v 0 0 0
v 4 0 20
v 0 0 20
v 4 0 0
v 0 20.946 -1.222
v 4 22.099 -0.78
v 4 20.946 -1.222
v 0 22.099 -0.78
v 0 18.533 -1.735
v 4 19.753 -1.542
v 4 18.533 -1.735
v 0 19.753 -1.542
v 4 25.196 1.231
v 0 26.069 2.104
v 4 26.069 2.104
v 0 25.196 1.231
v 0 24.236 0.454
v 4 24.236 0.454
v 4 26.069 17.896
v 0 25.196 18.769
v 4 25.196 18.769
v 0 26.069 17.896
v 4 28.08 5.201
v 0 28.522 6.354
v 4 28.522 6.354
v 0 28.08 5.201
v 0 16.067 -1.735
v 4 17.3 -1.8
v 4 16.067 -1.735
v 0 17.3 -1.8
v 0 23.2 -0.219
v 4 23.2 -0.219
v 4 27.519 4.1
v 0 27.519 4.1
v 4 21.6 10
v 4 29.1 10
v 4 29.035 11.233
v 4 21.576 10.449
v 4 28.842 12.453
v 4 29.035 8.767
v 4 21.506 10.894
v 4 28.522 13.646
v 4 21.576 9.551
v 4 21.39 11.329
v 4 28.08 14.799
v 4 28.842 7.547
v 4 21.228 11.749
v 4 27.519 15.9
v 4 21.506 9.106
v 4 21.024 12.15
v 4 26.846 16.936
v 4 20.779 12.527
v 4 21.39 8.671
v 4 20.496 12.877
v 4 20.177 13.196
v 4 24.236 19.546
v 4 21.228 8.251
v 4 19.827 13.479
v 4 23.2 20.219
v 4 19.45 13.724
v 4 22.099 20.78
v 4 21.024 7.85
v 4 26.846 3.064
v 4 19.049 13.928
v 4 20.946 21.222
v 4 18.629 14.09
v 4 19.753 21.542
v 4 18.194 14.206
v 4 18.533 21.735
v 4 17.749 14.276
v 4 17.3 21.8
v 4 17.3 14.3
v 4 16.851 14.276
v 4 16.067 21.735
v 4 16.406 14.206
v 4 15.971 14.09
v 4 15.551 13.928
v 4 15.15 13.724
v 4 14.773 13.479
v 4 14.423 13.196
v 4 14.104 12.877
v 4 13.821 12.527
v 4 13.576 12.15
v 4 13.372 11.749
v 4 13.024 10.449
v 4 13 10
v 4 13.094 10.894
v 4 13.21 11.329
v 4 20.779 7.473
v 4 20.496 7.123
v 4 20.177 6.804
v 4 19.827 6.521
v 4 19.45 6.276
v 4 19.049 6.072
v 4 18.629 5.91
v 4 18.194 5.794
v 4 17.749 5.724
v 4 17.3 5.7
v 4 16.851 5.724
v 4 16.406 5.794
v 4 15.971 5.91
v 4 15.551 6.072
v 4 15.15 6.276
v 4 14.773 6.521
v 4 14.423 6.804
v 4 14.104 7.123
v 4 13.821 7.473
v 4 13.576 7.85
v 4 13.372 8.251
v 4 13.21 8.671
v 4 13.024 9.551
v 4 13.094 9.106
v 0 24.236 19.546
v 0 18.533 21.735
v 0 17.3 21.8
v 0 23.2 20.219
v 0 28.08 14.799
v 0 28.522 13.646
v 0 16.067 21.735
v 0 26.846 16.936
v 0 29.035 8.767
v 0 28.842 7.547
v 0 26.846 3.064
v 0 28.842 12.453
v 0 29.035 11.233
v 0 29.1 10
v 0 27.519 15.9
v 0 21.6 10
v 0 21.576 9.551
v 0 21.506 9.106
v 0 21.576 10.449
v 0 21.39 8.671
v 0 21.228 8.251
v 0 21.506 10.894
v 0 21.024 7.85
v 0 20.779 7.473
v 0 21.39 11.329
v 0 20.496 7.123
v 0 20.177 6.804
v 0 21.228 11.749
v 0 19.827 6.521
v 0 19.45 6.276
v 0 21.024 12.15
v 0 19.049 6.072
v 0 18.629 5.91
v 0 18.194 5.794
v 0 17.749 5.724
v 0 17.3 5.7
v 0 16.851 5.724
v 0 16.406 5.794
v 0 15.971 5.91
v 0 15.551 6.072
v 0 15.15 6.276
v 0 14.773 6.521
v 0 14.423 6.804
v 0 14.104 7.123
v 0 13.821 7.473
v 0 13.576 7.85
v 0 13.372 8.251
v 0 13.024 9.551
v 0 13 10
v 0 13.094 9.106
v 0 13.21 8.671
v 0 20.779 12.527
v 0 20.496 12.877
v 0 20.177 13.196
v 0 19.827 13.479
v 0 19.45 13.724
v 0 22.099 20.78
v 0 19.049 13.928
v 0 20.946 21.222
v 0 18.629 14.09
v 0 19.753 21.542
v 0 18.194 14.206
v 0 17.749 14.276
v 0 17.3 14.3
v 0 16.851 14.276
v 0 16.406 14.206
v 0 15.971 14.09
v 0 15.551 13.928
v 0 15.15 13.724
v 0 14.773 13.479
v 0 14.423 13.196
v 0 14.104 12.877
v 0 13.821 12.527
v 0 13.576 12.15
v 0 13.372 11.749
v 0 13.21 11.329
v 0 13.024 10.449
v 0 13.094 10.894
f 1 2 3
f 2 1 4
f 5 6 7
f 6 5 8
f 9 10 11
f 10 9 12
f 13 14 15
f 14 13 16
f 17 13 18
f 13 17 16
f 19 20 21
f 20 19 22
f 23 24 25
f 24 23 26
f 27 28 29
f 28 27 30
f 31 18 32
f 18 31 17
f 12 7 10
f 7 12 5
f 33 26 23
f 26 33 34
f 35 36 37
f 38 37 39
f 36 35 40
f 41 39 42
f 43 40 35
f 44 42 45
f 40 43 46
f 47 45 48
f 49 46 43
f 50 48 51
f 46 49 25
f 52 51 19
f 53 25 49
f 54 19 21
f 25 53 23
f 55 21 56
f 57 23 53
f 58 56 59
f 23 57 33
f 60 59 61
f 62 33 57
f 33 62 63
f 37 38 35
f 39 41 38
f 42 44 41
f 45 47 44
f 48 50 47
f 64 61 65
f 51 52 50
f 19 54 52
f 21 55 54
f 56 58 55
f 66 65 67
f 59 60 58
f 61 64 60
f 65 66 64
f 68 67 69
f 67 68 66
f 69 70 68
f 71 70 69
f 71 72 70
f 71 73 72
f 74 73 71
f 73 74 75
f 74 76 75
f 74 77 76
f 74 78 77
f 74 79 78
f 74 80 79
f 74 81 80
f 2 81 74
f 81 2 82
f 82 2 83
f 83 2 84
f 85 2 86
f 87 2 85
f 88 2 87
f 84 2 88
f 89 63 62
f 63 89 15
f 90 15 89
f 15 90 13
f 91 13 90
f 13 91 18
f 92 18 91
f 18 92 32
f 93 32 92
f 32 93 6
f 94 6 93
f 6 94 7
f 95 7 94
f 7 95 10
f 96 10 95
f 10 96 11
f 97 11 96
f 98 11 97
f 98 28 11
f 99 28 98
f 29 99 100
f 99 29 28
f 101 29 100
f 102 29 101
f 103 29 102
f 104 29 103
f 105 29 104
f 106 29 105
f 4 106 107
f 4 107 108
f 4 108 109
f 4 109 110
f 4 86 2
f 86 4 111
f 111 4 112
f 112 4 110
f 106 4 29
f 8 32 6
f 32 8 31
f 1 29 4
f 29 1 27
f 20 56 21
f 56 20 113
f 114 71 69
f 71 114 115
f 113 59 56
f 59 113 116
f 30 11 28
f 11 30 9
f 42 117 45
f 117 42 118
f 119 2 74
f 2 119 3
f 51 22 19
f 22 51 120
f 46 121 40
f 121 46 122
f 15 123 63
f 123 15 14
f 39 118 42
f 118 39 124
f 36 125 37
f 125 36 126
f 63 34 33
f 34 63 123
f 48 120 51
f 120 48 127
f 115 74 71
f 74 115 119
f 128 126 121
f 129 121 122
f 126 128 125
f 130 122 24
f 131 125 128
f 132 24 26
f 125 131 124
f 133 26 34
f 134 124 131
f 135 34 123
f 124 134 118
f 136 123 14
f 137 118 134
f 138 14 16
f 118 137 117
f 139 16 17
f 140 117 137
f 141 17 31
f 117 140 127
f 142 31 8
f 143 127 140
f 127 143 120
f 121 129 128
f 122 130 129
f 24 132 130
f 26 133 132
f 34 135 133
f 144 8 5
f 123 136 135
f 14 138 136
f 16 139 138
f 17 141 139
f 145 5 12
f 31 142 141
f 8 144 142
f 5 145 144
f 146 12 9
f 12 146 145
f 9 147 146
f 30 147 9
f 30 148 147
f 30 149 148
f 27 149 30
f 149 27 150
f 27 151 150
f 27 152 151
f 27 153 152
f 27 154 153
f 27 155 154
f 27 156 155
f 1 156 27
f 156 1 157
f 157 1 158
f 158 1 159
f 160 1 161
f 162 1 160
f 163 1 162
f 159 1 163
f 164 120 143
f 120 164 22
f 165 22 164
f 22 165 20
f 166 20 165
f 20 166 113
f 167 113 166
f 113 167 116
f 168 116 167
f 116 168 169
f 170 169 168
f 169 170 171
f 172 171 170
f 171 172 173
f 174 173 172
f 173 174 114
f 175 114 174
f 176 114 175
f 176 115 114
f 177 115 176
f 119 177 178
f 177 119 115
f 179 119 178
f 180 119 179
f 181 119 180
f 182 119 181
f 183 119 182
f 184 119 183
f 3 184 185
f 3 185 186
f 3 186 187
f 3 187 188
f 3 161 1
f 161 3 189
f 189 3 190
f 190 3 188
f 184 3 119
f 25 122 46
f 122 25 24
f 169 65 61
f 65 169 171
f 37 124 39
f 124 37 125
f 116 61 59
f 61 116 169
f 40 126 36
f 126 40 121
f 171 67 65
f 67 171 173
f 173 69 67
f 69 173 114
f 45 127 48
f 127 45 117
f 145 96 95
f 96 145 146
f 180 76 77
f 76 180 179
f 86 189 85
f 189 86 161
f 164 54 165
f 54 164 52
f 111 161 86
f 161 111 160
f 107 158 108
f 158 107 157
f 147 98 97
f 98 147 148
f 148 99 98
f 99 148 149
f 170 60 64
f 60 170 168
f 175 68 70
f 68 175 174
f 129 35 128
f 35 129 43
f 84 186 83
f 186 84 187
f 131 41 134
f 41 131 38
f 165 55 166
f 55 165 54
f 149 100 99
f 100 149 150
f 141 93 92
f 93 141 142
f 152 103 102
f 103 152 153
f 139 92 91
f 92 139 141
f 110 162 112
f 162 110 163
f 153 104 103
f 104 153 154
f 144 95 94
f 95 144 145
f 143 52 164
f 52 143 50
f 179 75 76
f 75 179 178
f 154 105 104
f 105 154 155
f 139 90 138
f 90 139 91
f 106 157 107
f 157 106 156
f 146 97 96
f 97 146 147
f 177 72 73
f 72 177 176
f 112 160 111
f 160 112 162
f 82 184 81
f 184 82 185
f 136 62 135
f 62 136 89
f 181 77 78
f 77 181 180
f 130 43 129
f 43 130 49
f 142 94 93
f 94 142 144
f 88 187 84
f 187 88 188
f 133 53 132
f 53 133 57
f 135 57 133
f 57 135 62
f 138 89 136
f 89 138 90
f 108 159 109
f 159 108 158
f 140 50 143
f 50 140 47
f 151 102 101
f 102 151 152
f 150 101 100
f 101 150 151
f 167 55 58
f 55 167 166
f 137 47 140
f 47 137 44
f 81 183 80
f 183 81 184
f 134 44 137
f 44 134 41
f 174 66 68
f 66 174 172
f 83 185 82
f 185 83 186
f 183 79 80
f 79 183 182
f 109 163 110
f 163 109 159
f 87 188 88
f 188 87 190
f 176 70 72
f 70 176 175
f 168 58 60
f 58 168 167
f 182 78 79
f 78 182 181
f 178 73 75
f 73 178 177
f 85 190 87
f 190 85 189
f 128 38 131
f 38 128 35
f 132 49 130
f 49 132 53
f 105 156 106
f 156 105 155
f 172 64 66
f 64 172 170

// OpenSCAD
include <../../parameters.scad>

module ALU_joint_B(height) {
    difference() {
        hull() {
            cube([4, 10, height]);

            translate([0, 608_bearing_outer_diameter-5, height/2])
                rotate([0, 90, 0])
                    cylinder(d=M8_screw_diameter+15, h=4, $fn=60);
        }
        translate([-0.1, 608_bearing_outer_diameter-5, height/2])
            rotate([0, 90, 0])
                cylinder(d=M8_screw_diameter, h=4.2, $fn=60);
    }
}
ALU_joint_B(20);
